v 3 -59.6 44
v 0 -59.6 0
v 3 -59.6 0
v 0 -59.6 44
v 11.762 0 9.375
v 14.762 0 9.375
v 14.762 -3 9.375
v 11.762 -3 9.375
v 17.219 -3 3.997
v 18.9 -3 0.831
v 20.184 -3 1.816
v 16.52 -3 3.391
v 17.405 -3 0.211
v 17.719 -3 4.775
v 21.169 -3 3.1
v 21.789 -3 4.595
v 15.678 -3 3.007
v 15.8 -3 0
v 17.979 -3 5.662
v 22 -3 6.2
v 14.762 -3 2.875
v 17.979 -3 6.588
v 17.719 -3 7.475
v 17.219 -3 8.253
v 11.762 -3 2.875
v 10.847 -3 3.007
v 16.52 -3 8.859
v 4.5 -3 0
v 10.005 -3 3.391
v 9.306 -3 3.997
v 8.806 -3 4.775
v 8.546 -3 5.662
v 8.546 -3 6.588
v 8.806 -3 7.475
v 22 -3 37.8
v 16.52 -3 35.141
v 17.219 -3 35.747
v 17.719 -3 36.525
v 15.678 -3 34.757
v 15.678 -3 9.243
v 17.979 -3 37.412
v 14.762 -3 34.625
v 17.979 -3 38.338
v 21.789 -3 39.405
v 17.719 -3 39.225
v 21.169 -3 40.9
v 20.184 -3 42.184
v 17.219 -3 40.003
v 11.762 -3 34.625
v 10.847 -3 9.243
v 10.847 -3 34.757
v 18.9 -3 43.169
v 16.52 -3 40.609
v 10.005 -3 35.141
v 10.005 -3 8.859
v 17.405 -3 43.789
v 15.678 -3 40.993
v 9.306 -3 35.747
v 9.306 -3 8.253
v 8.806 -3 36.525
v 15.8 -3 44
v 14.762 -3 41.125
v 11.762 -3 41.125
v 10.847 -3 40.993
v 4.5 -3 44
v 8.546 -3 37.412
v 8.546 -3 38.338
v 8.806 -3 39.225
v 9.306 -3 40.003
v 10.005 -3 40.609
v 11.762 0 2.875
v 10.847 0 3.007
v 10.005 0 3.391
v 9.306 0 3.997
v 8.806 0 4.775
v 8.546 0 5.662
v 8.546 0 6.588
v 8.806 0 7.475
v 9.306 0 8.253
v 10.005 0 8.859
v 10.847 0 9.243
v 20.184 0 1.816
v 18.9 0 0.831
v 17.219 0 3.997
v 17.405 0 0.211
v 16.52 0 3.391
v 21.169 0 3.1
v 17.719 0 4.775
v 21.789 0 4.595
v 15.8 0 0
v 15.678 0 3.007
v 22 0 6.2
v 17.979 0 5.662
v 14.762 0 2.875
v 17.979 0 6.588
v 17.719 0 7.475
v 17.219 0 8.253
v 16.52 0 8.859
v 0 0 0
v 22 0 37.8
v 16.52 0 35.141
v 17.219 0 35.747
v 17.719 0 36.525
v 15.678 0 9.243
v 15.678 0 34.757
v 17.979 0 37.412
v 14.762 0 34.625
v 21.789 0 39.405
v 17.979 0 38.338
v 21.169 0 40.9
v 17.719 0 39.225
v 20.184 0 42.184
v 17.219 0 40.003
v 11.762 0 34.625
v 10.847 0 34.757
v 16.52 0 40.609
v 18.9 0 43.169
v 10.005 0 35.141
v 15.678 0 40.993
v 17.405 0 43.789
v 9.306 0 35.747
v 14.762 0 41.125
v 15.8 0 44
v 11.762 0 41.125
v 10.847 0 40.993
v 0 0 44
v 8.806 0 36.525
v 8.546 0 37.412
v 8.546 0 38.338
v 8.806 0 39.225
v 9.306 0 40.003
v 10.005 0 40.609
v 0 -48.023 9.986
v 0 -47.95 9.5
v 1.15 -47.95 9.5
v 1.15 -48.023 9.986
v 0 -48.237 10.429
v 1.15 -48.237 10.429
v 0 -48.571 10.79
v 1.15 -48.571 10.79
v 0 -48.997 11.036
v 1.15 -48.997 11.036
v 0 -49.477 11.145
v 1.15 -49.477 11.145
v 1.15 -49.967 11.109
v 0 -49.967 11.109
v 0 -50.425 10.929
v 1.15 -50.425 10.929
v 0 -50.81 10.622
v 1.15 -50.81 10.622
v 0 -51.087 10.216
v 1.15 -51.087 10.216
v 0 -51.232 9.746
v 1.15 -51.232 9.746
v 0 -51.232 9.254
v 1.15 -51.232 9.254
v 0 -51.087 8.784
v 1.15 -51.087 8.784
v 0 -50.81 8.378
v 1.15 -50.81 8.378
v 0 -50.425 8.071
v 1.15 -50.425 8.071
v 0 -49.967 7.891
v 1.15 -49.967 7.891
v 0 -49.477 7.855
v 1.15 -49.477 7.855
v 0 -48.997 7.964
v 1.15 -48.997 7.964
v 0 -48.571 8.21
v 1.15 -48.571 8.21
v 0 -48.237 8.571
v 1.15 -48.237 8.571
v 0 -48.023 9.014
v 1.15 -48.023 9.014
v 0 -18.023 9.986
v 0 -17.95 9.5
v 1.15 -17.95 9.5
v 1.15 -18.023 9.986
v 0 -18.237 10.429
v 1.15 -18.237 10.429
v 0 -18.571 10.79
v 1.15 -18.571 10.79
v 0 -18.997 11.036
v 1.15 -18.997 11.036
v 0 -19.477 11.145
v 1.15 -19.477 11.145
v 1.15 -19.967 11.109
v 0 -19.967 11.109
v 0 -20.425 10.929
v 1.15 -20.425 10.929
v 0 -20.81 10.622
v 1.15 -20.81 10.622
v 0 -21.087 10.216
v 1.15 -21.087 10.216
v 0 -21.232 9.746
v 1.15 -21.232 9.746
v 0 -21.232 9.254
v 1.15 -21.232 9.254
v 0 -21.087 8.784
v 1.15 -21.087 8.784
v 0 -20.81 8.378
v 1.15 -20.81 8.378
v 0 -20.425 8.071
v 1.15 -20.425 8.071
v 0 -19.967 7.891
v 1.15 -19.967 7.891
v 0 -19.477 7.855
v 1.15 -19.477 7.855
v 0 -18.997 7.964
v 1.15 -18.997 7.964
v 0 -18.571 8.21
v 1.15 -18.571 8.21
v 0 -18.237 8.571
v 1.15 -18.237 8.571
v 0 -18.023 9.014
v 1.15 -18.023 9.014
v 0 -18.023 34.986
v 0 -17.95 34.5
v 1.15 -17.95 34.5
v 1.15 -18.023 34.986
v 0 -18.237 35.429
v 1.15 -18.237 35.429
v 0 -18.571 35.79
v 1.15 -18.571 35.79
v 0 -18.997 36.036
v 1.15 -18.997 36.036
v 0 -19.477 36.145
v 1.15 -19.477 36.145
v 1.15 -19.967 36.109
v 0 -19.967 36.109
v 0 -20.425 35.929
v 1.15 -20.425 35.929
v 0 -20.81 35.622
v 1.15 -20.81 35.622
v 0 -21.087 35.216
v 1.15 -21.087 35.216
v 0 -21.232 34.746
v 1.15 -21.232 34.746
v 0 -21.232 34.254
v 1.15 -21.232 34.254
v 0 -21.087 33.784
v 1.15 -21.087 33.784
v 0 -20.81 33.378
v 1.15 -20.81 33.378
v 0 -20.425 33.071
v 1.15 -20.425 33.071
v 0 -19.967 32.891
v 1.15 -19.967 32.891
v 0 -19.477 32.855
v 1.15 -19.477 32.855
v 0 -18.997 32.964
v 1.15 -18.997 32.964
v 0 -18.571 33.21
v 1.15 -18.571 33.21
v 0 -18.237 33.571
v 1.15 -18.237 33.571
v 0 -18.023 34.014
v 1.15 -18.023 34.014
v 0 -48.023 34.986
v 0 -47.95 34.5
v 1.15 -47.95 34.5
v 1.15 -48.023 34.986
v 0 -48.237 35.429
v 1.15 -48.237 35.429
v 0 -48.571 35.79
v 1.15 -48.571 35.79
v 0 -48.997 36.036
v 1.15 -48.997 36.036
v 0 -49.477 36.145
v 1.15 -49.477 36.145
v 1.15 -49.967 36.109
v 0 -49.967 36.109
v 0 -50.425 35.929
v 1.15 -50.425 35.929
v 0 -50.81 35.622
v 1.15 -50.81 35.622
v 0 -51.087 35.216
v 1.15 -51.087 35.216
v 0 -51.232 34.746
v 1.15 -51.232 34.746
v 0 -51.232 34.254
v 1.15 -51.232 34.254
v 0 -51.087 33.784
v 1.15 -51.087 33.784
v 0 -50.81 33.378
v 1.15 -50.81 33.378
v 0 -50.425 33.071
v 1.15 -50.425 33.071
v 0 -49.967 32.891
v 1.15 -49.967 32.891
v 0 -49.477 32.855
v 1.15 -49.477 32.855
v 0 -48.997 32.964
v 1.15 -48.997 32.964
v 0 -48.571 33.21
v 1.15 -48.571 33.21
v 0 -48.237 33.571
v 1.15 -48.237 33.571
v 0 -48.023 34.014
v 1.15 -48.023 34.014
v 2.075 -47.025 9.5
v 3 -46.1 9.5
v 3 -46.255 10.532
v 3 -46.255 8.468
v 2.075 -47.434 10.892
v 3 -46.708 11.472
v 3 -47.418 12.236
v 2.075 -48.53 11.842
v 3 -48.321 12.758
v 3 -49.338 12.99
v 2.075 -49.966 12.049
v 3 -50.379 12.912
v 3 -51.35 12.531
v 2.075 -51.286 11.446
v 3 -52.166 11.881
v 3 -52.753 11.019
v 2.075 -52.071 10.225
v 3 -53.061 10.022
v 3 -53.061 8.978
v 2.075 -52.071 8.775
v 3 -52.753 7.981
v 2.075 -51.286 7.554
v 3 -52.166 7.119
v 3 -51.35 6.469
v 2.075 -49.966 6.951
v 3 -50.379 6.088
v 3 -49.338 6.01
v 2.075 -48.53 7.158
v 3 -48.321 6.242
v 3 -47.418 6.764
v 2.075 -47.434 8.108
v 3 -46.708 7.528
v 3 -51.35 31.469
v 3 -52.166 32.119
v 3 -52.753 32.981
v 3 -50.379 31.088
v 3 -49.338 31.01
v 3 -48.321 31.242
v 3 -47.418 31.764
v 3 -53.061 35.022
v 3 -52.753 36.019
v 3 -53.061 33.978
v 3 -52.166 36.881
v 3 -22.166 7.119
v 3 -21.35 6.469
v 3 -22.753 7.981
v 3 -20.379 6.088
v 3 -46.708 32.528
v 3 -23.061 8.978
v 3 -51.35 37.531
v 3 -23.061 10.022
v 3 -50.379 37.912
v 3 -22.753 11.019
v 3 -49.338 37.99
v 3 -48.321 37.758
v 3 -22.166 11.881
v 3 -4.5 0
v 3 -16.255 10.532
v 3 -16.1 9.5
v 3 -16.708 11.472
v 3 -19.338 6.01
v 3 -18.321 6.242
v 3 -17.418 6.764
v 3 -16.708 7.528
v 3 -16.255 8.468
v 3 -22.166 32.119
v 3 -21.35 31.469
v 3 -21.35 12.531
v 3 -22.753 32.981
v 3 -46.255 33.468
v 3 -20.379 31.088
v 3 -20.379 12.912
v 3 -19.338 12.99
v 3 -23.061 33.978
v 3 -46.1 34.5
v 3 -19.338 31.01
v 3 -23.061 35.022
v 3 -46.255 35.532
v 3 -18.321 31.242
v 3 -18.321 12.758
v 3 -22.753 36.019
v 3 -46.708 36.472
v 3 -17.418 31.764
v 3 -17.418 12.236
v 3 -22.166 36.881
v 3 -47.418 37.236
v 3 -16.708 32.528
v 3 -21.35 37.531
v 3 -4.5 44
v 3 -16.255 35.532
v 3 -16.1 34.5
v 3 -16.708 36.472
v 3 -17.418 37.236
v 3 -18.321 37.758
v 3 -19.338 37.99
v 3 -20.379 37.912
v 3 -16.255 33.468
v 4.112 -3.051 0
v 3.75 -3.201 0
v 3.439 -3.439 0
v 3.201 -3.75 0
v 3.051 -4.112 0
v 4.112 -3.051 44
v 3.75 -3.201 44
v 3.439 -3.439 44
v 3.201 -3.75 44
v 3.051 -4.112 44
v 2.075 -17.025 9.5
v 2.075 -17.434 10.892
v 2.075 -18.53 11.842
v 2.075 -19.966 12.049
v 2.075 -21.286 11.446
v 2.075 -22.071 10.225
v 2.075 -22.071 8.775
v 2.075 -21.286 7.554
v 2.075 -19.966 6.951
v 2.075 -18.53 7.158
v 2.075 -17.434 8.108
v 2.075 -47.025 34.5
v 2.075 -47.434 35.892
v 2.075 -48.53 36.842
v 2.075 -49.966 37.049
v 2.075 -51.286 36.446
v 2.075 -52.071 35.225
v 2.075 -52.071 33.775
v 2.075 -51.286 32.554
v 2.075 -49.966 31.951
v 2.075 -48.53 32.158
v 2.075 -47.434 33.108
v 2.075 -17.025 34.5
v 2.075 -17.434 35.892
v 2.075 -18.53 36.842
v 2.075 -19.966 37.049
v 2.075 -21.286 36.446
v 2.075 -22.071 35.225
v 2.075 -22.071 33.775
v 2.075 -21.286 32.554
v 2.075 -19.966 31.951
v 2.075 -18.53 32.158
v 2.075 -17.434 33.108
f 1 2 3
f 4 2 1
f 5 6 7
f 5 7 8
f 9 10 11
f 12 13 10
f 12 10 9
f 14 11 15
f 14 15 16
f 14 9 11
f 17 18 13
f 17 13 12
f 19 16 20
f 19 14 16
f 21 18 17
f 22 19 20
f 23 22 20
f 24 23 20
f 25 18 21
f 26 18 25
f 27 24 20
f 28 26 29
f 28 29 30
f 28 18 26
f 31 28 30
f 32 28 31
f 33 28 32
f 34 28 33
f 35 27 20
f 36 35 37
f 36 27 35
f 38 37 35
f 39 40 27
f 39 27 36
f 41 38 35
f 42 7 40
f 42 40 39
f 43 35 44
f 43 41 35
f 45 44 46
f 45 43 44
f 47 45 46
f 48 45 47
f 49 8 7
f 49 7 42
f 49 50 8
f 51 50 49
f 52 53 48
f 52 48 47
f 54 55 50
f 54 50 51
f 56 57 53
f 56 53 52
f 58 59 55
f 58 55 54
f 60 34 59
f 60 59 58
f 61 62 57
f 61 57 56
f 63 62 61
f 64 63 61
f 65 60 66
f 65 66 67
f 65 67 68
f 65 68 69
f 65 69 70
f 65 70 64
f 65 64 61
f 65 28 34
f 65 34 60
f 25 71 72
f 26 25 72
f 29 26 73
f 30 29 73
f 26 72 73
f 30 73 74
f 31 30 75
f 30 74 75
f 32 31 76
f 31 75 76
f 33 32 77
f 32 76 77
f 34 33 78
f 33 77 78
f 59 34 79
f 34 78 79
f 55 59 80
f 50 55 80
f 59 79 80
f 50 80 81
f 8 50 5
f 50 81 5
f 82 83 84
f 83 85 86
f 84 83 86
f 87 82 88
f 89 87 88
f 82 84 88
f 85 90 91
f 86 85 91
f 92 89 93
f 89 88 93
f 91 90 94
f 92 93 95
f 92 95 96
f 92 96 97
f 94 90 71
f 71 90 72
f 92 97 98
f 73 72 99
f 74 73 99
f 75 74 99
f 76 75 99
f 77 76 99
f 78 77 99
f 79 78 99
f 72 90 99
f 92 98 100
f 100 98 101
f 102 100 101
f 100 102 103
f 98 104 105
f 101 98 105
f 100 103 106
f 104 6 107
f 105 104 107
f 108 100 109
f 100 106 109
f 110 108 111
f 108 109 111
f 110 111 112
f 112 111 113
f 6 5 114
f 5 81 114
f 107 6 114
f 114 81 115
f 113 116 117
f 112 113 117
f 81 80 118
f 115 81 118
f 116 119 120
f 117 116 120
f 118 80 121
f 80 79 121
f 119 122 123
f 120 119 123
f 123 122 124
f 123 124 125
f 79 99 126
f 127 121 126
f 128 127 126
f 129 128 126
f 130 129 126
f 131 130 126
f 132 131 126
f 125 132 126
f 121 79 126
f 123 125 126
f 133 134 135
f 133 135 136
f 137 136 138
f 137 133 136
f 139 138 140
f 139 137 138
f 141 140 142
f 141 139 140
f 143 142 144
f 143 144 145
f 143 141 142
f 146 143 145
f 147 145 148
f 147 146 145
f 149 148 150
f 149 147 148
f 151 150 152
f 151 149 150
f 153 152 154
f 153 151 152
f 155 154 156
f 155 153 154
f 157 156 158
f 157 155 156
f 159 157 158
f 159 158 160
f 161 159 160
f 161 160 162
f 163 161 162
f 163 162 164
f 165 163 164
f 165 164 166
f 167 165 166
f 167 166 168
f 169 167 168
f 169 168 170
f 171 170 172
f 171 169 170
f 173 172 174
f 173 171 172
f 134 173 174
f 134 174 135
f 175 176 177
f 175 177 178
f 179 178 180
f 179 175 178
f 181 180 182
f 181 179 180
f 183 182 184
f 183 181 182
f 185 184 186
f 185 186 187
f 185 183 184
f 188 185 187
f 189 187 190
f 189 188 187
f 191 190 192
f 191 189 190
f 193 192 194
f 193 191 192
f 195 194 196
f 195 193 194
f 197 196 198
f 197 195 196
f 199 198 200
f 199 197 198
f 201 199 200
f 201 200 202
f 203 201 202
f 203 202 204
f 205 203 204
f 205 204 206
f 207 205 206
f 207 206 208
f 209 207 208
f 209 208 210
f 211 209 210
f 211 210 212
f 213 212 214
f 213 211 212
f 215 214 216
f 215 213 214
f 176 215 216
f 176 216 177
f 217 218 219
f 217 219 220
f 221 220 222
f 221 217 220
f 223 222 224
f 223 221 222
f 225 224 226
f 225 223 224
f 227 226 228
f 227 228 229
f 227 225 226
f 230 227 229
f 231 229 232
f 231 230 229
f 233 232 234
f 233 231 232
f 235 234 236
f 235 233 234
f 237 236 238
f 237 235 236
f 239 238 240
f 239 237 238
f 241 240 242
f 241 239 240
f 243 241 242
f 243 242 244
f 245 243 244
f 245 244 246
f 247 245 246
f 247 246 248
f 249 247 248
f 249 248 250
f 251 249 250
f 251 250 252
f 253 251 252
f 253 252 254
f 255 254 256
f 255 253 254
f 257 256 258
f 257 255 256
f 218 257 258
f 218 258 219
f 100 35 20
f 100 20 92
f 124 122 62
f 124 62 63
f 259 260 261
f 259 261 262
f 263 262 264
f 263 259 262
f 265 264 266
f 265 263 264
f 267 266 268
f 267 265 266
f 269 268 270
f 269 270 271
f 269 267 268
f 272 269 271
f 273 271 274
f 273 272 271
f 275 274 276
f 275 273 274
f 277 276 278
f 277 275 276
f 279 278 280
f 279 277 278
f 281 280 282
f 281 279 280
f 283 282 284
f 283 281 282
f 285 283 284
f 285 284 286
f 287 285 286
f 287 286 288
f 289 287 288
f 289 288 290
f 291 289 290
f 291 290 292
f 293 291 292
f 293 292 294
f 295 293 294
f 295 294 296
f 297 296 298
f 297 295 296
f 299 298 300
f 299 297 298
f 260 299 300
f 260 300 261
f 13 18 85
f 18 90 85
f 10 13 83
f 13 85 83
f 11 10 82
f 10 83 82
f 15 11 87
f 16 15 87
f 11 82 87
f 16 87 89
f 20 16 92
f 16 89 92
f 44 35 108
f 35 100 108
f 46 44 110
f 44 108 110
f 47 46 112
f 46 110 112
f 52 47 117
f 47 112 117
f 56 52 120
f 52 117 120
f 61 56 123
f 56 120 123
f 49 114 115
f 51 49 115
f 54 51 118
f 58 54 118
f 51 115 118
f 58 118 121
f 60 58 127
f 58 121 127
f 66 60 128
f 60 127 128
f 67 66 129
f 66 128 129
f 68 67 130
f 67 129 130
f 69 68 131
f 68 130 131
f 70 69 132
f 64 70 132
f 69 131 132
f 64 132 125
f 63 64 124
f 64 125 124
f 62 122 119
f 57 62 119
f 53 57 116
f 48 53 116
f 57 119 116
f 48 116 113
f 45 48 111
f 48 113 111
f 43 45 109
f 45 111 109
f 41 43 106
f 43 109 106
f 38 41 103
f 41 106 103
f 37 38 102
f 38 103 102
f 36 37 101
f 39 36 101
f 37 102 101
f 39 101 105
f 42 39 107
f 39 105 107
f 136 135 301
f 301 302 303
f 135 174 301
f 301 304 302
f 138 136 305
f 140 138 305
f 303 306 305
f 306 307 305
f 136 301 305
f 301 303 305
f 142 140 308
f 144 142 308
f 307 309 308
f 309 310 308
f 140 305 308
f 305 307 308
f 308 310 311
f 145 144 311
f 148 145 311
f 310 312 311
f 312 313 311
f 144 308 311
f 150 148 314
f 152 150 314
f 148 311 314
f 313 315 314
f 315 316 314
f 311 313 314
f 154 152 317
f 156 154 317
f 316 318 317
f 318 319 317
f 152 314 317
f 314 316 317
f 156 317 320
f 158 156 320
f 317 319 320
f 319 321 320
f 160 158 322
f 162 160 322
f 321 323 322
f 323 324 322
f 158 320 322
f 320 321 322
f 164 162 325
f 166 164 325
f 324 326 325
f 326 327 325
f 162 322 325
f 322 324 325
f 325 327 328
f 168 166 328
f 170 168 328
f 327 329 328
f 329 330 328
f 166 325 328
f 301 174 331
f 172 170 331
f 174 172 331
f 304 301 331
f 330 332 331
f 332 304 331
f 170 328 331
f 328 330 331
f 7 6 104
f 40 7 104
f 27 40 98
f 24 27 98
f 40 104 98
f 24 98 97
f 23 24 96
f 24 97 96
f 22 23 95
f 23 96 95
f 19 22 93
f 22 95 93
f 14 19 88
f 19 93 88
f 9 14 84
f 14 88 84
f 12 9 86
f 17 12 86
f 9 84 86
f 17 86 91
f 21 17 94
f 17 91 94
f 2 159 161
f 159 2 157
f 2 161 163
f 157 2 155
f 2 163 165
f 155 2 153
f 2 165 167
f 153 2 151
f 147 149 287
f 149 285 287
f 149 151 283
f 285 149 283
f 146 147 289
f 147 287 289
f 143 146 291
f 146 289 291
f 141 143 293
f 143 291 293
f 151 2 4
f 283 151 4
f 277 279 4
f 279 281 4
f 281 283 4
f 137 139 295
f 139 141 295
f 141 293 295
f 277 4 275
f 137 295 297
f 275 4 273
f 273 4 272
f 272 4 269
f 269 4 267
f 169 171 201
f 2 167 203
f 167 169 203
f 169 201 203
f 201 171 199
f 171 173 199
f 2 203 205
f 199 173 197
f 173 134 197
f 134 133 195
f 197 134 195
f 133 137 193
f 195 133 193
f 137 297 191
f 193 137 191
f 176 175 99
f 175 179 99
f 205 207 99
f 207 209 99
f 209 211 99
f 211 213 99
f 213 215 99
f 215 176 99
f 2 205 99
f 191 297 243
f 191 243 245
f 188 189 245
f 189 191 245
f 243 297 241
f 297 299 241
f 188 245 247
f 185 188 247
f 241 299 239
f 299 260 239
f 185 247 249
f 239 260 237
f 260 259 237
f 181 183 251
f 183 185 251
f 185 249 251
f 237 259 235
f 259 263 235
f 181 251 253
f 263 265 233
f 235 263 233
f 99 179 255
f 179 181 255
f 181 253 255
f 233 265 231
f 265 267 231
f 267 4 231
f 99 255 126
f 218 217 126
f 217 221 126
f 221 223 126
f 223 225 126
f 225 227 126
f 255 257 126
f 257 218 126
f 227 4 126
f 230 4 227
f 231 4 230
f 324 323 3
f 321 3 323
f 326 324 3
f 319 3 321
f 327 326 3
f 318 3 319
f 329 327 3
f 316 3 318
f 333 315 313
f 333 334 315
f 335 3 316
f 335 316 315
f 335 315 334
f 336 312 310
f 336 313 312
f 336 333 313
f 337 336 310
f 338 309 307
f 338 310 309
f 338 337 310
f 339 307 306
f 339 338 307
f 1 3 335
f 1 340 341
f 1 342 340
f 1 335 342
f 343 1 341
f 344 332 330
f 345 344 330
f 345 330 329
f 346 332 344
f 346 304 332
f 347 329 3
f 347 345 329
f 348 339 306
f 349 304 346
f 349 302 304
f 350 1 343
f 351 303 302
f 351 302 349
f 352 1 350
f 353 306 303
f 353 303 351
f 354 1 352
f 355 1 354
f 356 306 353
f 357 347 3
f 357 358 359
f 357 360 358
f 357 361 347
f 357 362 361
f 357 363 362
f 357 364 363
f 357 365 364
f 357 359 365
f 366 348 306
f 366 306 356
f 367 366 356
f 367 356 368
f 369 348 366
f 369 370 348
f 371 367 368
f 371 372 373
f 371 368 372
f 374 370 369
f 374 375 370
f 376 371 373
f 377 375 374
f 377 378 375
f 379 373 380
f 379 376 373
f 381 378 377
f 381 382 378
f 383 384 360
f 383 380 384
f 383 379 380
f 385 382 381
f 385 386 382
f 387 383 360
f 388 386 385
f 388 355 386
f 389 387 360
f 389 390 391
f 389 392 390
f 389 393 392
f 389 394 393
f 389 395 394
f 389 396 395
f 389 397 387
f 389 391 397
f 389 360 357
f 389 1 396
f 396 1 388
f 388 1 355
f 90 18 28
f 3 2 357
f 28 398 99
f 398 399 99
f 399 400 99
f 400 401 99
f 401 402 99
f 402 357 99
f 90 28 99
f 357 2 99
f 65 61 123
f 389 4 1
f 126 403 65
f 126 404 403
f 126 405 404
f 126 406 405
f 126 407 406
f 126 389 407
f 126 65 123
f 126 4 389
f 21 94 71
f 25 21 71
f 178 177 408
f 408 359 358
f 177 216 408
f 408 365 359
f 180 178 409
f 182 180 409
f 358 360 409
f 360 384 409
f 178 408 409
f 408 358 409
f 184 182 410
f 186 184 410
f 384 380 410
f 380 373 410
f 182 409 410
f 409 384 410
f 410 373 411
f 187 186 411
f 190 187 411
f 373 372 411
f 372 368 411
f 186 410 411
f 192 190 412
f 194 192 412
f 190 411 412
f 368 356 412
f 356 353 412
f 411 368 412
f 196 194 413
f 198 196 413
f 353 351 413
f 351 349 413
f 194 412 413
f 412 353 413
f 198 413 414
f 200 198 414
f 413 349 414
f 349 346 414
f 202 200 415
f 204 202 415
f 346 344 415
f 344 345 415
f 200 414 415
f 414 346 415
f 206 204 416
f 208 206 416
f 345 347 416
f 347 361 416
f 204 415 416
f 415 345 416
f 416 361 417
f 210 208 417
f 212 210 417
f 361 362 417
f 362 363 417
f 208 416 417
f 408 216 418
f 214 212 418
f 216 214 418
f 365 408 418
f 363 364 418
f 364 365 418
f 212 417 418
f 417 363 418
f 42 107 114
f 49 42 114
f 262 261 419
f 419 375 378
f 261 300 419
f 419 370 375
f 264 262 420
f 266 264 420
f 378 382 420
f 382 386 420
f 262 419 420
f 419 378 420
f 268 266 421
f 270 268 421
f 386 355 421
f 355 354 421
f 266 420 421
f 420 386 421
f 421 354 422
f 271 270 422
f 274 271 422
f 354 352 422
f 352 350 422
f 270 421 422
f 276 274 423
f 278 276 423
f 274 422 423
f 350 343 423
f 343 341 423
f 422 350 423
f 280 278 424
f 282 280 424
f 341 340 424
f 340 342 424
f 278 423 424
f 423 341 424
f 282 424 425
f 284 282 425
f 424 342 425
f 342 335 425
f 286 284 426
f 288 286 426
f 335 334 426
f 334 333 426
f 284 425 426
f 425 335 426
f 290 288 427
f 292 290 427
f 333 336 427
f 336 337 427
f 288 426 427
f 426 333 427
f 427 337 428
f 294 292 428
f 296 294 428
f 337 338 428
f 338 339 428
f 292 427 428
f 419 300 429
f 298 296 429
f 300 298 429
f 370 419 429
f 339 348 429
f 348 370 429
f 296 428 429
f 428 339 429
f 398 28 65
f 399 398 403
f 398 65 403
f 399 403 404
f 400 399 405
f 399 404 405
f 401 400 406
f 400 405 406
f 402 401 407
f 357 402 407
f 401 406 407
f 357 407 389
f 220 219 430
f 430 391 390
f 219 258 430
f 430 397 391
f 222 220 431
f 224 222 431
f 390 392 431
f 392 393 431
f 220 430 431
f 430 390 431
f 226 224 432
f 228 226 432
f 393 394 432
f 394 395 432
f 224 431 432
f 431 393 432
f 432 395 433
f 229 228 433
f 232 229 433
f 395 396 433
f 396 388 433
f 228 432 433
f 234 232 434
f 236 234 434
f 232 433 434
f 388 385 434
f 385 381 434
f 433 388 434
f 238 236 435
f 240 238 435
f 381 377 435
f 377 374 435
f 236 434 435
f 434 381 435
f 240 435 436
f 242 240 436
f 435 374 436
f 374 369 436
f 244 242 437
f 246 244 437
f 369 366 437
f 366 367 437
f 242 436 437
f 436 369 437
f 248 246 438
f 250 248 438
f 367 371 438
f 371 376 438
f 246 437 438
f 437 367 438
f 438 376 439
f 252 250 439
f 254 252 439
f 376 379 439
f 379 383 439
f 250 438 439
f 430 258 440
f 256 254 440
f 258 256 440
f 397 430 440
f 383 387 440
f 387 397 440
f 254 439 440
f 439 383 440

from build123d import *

# Parameters (mm, degrees)
SKETCH011_W     = 59.6
SKETCH011_H     = 44
SKETCH011_R     = 1.65
PAD006_DEPTH    = 3
CHAMFER003_SIZE = 1.85
SKETCH012_W     = 3
SKETCH012_H     = 44
PAD007_DEPTH    = 19
POCKET005_DEPTH = 59.601
FILLET_R        = 1.5
FILLET001_R     = 6.2


with BuildPart() as part:
    # Sketch011 → Pad006 (new body)
    with BuildSketch(Plane.YZ):
        with Locations((-29.8, 22)):
            Rectangle(SKETCH011_W, SKETCH011_H)
        with Locations((-49.6, 34.5)):
            Circle(SKETCH011_R, mode=Mode.SUBTRACT)
        with Locations((-19.6, 34.5)):
            Circle(SKETCH011_R, mode=Mode.SUBTRACT)
        with Locations((-49.6, 9.5)):
            Circle(SKETCH011_R, mode=Mode.SUBTRACT)
        with Locations((-19.6, 9.5)):
            Circle(SKETCH011_R, mode=Mode.SUBTRACT)
    extrude(amount=PAD006_DEPTH)

    # Chamfer003
    chamfer003_edges = [part.edges().sort_by_distance(p)[0] for p in [
        (3, -51.25, 34.5),
        (3, -21.25, 34.5),
        (3, -51.25, 9.5),
        (3, -21.25, 9.5),
    ]]
    chamfer(chamfer003_edges, length=CHAMFER003_SIZE)

    # Sketch012 (on Face4 of Chamfer003) → Pad007 (join)
    with BuildSketch(Plane.YZ.offset(3)):
        with Locations((-1.5, 22)):
            Rectangle(SKETCH012_W, SKETCH012_H)
    extrude(amount=PAD007_DEPTH)

    # Sketch013 (on Face16 of Pad007) → Pocket005 (cut, through all)
    with BuildSketch(Plane.ZX):
        with BuildLine():
            ThreePointArc((9.375, 14.7625), (6.125, 18.0125), (2.875, 14.7625))
            Line((2.875, 14.7625), (2.875, 11.7625))
            ThreePointArc((2.875, 11.7625), (6.125, 8.5125), (9.375, 11.7625))
            Line((9.375, 14.7625), (9.375, 11.7625))
        make_face()
        with BuildLine():
            ThreePointArc((41.125, 14.7625), (37.875, 18.0125), (34.625, 14.7625))
            Line((34.625, 14.7625), (34.625, 11.7625))
            ThreePointArc((34.625, 11.7625), (37.875, 8.5125), (41.125, 11.7625))
            Line((41.125, 14.7625), (41.125, 11.7625))
        make_face()
    extrude(amount=-POCKET005_DEPTH, mode=Mode.SUBTRACT)

    # Fillet
    fillet_edges = [part.edges().sort_by_distance(p)[0] for p in [
        (3, -3, 22),
    ]]
    fillet(fillet_edges, radius=FILLET_R)

    # Fillet001
    fillet001_edges = [part.edges().sort_by_distance(p)[0] for p in [
        (22, -1.5, 44),
        (22, -1.5, 0),
    ]]
    fillet(fillet001_edges, radius=FILLET001_R)


solid = part.part
